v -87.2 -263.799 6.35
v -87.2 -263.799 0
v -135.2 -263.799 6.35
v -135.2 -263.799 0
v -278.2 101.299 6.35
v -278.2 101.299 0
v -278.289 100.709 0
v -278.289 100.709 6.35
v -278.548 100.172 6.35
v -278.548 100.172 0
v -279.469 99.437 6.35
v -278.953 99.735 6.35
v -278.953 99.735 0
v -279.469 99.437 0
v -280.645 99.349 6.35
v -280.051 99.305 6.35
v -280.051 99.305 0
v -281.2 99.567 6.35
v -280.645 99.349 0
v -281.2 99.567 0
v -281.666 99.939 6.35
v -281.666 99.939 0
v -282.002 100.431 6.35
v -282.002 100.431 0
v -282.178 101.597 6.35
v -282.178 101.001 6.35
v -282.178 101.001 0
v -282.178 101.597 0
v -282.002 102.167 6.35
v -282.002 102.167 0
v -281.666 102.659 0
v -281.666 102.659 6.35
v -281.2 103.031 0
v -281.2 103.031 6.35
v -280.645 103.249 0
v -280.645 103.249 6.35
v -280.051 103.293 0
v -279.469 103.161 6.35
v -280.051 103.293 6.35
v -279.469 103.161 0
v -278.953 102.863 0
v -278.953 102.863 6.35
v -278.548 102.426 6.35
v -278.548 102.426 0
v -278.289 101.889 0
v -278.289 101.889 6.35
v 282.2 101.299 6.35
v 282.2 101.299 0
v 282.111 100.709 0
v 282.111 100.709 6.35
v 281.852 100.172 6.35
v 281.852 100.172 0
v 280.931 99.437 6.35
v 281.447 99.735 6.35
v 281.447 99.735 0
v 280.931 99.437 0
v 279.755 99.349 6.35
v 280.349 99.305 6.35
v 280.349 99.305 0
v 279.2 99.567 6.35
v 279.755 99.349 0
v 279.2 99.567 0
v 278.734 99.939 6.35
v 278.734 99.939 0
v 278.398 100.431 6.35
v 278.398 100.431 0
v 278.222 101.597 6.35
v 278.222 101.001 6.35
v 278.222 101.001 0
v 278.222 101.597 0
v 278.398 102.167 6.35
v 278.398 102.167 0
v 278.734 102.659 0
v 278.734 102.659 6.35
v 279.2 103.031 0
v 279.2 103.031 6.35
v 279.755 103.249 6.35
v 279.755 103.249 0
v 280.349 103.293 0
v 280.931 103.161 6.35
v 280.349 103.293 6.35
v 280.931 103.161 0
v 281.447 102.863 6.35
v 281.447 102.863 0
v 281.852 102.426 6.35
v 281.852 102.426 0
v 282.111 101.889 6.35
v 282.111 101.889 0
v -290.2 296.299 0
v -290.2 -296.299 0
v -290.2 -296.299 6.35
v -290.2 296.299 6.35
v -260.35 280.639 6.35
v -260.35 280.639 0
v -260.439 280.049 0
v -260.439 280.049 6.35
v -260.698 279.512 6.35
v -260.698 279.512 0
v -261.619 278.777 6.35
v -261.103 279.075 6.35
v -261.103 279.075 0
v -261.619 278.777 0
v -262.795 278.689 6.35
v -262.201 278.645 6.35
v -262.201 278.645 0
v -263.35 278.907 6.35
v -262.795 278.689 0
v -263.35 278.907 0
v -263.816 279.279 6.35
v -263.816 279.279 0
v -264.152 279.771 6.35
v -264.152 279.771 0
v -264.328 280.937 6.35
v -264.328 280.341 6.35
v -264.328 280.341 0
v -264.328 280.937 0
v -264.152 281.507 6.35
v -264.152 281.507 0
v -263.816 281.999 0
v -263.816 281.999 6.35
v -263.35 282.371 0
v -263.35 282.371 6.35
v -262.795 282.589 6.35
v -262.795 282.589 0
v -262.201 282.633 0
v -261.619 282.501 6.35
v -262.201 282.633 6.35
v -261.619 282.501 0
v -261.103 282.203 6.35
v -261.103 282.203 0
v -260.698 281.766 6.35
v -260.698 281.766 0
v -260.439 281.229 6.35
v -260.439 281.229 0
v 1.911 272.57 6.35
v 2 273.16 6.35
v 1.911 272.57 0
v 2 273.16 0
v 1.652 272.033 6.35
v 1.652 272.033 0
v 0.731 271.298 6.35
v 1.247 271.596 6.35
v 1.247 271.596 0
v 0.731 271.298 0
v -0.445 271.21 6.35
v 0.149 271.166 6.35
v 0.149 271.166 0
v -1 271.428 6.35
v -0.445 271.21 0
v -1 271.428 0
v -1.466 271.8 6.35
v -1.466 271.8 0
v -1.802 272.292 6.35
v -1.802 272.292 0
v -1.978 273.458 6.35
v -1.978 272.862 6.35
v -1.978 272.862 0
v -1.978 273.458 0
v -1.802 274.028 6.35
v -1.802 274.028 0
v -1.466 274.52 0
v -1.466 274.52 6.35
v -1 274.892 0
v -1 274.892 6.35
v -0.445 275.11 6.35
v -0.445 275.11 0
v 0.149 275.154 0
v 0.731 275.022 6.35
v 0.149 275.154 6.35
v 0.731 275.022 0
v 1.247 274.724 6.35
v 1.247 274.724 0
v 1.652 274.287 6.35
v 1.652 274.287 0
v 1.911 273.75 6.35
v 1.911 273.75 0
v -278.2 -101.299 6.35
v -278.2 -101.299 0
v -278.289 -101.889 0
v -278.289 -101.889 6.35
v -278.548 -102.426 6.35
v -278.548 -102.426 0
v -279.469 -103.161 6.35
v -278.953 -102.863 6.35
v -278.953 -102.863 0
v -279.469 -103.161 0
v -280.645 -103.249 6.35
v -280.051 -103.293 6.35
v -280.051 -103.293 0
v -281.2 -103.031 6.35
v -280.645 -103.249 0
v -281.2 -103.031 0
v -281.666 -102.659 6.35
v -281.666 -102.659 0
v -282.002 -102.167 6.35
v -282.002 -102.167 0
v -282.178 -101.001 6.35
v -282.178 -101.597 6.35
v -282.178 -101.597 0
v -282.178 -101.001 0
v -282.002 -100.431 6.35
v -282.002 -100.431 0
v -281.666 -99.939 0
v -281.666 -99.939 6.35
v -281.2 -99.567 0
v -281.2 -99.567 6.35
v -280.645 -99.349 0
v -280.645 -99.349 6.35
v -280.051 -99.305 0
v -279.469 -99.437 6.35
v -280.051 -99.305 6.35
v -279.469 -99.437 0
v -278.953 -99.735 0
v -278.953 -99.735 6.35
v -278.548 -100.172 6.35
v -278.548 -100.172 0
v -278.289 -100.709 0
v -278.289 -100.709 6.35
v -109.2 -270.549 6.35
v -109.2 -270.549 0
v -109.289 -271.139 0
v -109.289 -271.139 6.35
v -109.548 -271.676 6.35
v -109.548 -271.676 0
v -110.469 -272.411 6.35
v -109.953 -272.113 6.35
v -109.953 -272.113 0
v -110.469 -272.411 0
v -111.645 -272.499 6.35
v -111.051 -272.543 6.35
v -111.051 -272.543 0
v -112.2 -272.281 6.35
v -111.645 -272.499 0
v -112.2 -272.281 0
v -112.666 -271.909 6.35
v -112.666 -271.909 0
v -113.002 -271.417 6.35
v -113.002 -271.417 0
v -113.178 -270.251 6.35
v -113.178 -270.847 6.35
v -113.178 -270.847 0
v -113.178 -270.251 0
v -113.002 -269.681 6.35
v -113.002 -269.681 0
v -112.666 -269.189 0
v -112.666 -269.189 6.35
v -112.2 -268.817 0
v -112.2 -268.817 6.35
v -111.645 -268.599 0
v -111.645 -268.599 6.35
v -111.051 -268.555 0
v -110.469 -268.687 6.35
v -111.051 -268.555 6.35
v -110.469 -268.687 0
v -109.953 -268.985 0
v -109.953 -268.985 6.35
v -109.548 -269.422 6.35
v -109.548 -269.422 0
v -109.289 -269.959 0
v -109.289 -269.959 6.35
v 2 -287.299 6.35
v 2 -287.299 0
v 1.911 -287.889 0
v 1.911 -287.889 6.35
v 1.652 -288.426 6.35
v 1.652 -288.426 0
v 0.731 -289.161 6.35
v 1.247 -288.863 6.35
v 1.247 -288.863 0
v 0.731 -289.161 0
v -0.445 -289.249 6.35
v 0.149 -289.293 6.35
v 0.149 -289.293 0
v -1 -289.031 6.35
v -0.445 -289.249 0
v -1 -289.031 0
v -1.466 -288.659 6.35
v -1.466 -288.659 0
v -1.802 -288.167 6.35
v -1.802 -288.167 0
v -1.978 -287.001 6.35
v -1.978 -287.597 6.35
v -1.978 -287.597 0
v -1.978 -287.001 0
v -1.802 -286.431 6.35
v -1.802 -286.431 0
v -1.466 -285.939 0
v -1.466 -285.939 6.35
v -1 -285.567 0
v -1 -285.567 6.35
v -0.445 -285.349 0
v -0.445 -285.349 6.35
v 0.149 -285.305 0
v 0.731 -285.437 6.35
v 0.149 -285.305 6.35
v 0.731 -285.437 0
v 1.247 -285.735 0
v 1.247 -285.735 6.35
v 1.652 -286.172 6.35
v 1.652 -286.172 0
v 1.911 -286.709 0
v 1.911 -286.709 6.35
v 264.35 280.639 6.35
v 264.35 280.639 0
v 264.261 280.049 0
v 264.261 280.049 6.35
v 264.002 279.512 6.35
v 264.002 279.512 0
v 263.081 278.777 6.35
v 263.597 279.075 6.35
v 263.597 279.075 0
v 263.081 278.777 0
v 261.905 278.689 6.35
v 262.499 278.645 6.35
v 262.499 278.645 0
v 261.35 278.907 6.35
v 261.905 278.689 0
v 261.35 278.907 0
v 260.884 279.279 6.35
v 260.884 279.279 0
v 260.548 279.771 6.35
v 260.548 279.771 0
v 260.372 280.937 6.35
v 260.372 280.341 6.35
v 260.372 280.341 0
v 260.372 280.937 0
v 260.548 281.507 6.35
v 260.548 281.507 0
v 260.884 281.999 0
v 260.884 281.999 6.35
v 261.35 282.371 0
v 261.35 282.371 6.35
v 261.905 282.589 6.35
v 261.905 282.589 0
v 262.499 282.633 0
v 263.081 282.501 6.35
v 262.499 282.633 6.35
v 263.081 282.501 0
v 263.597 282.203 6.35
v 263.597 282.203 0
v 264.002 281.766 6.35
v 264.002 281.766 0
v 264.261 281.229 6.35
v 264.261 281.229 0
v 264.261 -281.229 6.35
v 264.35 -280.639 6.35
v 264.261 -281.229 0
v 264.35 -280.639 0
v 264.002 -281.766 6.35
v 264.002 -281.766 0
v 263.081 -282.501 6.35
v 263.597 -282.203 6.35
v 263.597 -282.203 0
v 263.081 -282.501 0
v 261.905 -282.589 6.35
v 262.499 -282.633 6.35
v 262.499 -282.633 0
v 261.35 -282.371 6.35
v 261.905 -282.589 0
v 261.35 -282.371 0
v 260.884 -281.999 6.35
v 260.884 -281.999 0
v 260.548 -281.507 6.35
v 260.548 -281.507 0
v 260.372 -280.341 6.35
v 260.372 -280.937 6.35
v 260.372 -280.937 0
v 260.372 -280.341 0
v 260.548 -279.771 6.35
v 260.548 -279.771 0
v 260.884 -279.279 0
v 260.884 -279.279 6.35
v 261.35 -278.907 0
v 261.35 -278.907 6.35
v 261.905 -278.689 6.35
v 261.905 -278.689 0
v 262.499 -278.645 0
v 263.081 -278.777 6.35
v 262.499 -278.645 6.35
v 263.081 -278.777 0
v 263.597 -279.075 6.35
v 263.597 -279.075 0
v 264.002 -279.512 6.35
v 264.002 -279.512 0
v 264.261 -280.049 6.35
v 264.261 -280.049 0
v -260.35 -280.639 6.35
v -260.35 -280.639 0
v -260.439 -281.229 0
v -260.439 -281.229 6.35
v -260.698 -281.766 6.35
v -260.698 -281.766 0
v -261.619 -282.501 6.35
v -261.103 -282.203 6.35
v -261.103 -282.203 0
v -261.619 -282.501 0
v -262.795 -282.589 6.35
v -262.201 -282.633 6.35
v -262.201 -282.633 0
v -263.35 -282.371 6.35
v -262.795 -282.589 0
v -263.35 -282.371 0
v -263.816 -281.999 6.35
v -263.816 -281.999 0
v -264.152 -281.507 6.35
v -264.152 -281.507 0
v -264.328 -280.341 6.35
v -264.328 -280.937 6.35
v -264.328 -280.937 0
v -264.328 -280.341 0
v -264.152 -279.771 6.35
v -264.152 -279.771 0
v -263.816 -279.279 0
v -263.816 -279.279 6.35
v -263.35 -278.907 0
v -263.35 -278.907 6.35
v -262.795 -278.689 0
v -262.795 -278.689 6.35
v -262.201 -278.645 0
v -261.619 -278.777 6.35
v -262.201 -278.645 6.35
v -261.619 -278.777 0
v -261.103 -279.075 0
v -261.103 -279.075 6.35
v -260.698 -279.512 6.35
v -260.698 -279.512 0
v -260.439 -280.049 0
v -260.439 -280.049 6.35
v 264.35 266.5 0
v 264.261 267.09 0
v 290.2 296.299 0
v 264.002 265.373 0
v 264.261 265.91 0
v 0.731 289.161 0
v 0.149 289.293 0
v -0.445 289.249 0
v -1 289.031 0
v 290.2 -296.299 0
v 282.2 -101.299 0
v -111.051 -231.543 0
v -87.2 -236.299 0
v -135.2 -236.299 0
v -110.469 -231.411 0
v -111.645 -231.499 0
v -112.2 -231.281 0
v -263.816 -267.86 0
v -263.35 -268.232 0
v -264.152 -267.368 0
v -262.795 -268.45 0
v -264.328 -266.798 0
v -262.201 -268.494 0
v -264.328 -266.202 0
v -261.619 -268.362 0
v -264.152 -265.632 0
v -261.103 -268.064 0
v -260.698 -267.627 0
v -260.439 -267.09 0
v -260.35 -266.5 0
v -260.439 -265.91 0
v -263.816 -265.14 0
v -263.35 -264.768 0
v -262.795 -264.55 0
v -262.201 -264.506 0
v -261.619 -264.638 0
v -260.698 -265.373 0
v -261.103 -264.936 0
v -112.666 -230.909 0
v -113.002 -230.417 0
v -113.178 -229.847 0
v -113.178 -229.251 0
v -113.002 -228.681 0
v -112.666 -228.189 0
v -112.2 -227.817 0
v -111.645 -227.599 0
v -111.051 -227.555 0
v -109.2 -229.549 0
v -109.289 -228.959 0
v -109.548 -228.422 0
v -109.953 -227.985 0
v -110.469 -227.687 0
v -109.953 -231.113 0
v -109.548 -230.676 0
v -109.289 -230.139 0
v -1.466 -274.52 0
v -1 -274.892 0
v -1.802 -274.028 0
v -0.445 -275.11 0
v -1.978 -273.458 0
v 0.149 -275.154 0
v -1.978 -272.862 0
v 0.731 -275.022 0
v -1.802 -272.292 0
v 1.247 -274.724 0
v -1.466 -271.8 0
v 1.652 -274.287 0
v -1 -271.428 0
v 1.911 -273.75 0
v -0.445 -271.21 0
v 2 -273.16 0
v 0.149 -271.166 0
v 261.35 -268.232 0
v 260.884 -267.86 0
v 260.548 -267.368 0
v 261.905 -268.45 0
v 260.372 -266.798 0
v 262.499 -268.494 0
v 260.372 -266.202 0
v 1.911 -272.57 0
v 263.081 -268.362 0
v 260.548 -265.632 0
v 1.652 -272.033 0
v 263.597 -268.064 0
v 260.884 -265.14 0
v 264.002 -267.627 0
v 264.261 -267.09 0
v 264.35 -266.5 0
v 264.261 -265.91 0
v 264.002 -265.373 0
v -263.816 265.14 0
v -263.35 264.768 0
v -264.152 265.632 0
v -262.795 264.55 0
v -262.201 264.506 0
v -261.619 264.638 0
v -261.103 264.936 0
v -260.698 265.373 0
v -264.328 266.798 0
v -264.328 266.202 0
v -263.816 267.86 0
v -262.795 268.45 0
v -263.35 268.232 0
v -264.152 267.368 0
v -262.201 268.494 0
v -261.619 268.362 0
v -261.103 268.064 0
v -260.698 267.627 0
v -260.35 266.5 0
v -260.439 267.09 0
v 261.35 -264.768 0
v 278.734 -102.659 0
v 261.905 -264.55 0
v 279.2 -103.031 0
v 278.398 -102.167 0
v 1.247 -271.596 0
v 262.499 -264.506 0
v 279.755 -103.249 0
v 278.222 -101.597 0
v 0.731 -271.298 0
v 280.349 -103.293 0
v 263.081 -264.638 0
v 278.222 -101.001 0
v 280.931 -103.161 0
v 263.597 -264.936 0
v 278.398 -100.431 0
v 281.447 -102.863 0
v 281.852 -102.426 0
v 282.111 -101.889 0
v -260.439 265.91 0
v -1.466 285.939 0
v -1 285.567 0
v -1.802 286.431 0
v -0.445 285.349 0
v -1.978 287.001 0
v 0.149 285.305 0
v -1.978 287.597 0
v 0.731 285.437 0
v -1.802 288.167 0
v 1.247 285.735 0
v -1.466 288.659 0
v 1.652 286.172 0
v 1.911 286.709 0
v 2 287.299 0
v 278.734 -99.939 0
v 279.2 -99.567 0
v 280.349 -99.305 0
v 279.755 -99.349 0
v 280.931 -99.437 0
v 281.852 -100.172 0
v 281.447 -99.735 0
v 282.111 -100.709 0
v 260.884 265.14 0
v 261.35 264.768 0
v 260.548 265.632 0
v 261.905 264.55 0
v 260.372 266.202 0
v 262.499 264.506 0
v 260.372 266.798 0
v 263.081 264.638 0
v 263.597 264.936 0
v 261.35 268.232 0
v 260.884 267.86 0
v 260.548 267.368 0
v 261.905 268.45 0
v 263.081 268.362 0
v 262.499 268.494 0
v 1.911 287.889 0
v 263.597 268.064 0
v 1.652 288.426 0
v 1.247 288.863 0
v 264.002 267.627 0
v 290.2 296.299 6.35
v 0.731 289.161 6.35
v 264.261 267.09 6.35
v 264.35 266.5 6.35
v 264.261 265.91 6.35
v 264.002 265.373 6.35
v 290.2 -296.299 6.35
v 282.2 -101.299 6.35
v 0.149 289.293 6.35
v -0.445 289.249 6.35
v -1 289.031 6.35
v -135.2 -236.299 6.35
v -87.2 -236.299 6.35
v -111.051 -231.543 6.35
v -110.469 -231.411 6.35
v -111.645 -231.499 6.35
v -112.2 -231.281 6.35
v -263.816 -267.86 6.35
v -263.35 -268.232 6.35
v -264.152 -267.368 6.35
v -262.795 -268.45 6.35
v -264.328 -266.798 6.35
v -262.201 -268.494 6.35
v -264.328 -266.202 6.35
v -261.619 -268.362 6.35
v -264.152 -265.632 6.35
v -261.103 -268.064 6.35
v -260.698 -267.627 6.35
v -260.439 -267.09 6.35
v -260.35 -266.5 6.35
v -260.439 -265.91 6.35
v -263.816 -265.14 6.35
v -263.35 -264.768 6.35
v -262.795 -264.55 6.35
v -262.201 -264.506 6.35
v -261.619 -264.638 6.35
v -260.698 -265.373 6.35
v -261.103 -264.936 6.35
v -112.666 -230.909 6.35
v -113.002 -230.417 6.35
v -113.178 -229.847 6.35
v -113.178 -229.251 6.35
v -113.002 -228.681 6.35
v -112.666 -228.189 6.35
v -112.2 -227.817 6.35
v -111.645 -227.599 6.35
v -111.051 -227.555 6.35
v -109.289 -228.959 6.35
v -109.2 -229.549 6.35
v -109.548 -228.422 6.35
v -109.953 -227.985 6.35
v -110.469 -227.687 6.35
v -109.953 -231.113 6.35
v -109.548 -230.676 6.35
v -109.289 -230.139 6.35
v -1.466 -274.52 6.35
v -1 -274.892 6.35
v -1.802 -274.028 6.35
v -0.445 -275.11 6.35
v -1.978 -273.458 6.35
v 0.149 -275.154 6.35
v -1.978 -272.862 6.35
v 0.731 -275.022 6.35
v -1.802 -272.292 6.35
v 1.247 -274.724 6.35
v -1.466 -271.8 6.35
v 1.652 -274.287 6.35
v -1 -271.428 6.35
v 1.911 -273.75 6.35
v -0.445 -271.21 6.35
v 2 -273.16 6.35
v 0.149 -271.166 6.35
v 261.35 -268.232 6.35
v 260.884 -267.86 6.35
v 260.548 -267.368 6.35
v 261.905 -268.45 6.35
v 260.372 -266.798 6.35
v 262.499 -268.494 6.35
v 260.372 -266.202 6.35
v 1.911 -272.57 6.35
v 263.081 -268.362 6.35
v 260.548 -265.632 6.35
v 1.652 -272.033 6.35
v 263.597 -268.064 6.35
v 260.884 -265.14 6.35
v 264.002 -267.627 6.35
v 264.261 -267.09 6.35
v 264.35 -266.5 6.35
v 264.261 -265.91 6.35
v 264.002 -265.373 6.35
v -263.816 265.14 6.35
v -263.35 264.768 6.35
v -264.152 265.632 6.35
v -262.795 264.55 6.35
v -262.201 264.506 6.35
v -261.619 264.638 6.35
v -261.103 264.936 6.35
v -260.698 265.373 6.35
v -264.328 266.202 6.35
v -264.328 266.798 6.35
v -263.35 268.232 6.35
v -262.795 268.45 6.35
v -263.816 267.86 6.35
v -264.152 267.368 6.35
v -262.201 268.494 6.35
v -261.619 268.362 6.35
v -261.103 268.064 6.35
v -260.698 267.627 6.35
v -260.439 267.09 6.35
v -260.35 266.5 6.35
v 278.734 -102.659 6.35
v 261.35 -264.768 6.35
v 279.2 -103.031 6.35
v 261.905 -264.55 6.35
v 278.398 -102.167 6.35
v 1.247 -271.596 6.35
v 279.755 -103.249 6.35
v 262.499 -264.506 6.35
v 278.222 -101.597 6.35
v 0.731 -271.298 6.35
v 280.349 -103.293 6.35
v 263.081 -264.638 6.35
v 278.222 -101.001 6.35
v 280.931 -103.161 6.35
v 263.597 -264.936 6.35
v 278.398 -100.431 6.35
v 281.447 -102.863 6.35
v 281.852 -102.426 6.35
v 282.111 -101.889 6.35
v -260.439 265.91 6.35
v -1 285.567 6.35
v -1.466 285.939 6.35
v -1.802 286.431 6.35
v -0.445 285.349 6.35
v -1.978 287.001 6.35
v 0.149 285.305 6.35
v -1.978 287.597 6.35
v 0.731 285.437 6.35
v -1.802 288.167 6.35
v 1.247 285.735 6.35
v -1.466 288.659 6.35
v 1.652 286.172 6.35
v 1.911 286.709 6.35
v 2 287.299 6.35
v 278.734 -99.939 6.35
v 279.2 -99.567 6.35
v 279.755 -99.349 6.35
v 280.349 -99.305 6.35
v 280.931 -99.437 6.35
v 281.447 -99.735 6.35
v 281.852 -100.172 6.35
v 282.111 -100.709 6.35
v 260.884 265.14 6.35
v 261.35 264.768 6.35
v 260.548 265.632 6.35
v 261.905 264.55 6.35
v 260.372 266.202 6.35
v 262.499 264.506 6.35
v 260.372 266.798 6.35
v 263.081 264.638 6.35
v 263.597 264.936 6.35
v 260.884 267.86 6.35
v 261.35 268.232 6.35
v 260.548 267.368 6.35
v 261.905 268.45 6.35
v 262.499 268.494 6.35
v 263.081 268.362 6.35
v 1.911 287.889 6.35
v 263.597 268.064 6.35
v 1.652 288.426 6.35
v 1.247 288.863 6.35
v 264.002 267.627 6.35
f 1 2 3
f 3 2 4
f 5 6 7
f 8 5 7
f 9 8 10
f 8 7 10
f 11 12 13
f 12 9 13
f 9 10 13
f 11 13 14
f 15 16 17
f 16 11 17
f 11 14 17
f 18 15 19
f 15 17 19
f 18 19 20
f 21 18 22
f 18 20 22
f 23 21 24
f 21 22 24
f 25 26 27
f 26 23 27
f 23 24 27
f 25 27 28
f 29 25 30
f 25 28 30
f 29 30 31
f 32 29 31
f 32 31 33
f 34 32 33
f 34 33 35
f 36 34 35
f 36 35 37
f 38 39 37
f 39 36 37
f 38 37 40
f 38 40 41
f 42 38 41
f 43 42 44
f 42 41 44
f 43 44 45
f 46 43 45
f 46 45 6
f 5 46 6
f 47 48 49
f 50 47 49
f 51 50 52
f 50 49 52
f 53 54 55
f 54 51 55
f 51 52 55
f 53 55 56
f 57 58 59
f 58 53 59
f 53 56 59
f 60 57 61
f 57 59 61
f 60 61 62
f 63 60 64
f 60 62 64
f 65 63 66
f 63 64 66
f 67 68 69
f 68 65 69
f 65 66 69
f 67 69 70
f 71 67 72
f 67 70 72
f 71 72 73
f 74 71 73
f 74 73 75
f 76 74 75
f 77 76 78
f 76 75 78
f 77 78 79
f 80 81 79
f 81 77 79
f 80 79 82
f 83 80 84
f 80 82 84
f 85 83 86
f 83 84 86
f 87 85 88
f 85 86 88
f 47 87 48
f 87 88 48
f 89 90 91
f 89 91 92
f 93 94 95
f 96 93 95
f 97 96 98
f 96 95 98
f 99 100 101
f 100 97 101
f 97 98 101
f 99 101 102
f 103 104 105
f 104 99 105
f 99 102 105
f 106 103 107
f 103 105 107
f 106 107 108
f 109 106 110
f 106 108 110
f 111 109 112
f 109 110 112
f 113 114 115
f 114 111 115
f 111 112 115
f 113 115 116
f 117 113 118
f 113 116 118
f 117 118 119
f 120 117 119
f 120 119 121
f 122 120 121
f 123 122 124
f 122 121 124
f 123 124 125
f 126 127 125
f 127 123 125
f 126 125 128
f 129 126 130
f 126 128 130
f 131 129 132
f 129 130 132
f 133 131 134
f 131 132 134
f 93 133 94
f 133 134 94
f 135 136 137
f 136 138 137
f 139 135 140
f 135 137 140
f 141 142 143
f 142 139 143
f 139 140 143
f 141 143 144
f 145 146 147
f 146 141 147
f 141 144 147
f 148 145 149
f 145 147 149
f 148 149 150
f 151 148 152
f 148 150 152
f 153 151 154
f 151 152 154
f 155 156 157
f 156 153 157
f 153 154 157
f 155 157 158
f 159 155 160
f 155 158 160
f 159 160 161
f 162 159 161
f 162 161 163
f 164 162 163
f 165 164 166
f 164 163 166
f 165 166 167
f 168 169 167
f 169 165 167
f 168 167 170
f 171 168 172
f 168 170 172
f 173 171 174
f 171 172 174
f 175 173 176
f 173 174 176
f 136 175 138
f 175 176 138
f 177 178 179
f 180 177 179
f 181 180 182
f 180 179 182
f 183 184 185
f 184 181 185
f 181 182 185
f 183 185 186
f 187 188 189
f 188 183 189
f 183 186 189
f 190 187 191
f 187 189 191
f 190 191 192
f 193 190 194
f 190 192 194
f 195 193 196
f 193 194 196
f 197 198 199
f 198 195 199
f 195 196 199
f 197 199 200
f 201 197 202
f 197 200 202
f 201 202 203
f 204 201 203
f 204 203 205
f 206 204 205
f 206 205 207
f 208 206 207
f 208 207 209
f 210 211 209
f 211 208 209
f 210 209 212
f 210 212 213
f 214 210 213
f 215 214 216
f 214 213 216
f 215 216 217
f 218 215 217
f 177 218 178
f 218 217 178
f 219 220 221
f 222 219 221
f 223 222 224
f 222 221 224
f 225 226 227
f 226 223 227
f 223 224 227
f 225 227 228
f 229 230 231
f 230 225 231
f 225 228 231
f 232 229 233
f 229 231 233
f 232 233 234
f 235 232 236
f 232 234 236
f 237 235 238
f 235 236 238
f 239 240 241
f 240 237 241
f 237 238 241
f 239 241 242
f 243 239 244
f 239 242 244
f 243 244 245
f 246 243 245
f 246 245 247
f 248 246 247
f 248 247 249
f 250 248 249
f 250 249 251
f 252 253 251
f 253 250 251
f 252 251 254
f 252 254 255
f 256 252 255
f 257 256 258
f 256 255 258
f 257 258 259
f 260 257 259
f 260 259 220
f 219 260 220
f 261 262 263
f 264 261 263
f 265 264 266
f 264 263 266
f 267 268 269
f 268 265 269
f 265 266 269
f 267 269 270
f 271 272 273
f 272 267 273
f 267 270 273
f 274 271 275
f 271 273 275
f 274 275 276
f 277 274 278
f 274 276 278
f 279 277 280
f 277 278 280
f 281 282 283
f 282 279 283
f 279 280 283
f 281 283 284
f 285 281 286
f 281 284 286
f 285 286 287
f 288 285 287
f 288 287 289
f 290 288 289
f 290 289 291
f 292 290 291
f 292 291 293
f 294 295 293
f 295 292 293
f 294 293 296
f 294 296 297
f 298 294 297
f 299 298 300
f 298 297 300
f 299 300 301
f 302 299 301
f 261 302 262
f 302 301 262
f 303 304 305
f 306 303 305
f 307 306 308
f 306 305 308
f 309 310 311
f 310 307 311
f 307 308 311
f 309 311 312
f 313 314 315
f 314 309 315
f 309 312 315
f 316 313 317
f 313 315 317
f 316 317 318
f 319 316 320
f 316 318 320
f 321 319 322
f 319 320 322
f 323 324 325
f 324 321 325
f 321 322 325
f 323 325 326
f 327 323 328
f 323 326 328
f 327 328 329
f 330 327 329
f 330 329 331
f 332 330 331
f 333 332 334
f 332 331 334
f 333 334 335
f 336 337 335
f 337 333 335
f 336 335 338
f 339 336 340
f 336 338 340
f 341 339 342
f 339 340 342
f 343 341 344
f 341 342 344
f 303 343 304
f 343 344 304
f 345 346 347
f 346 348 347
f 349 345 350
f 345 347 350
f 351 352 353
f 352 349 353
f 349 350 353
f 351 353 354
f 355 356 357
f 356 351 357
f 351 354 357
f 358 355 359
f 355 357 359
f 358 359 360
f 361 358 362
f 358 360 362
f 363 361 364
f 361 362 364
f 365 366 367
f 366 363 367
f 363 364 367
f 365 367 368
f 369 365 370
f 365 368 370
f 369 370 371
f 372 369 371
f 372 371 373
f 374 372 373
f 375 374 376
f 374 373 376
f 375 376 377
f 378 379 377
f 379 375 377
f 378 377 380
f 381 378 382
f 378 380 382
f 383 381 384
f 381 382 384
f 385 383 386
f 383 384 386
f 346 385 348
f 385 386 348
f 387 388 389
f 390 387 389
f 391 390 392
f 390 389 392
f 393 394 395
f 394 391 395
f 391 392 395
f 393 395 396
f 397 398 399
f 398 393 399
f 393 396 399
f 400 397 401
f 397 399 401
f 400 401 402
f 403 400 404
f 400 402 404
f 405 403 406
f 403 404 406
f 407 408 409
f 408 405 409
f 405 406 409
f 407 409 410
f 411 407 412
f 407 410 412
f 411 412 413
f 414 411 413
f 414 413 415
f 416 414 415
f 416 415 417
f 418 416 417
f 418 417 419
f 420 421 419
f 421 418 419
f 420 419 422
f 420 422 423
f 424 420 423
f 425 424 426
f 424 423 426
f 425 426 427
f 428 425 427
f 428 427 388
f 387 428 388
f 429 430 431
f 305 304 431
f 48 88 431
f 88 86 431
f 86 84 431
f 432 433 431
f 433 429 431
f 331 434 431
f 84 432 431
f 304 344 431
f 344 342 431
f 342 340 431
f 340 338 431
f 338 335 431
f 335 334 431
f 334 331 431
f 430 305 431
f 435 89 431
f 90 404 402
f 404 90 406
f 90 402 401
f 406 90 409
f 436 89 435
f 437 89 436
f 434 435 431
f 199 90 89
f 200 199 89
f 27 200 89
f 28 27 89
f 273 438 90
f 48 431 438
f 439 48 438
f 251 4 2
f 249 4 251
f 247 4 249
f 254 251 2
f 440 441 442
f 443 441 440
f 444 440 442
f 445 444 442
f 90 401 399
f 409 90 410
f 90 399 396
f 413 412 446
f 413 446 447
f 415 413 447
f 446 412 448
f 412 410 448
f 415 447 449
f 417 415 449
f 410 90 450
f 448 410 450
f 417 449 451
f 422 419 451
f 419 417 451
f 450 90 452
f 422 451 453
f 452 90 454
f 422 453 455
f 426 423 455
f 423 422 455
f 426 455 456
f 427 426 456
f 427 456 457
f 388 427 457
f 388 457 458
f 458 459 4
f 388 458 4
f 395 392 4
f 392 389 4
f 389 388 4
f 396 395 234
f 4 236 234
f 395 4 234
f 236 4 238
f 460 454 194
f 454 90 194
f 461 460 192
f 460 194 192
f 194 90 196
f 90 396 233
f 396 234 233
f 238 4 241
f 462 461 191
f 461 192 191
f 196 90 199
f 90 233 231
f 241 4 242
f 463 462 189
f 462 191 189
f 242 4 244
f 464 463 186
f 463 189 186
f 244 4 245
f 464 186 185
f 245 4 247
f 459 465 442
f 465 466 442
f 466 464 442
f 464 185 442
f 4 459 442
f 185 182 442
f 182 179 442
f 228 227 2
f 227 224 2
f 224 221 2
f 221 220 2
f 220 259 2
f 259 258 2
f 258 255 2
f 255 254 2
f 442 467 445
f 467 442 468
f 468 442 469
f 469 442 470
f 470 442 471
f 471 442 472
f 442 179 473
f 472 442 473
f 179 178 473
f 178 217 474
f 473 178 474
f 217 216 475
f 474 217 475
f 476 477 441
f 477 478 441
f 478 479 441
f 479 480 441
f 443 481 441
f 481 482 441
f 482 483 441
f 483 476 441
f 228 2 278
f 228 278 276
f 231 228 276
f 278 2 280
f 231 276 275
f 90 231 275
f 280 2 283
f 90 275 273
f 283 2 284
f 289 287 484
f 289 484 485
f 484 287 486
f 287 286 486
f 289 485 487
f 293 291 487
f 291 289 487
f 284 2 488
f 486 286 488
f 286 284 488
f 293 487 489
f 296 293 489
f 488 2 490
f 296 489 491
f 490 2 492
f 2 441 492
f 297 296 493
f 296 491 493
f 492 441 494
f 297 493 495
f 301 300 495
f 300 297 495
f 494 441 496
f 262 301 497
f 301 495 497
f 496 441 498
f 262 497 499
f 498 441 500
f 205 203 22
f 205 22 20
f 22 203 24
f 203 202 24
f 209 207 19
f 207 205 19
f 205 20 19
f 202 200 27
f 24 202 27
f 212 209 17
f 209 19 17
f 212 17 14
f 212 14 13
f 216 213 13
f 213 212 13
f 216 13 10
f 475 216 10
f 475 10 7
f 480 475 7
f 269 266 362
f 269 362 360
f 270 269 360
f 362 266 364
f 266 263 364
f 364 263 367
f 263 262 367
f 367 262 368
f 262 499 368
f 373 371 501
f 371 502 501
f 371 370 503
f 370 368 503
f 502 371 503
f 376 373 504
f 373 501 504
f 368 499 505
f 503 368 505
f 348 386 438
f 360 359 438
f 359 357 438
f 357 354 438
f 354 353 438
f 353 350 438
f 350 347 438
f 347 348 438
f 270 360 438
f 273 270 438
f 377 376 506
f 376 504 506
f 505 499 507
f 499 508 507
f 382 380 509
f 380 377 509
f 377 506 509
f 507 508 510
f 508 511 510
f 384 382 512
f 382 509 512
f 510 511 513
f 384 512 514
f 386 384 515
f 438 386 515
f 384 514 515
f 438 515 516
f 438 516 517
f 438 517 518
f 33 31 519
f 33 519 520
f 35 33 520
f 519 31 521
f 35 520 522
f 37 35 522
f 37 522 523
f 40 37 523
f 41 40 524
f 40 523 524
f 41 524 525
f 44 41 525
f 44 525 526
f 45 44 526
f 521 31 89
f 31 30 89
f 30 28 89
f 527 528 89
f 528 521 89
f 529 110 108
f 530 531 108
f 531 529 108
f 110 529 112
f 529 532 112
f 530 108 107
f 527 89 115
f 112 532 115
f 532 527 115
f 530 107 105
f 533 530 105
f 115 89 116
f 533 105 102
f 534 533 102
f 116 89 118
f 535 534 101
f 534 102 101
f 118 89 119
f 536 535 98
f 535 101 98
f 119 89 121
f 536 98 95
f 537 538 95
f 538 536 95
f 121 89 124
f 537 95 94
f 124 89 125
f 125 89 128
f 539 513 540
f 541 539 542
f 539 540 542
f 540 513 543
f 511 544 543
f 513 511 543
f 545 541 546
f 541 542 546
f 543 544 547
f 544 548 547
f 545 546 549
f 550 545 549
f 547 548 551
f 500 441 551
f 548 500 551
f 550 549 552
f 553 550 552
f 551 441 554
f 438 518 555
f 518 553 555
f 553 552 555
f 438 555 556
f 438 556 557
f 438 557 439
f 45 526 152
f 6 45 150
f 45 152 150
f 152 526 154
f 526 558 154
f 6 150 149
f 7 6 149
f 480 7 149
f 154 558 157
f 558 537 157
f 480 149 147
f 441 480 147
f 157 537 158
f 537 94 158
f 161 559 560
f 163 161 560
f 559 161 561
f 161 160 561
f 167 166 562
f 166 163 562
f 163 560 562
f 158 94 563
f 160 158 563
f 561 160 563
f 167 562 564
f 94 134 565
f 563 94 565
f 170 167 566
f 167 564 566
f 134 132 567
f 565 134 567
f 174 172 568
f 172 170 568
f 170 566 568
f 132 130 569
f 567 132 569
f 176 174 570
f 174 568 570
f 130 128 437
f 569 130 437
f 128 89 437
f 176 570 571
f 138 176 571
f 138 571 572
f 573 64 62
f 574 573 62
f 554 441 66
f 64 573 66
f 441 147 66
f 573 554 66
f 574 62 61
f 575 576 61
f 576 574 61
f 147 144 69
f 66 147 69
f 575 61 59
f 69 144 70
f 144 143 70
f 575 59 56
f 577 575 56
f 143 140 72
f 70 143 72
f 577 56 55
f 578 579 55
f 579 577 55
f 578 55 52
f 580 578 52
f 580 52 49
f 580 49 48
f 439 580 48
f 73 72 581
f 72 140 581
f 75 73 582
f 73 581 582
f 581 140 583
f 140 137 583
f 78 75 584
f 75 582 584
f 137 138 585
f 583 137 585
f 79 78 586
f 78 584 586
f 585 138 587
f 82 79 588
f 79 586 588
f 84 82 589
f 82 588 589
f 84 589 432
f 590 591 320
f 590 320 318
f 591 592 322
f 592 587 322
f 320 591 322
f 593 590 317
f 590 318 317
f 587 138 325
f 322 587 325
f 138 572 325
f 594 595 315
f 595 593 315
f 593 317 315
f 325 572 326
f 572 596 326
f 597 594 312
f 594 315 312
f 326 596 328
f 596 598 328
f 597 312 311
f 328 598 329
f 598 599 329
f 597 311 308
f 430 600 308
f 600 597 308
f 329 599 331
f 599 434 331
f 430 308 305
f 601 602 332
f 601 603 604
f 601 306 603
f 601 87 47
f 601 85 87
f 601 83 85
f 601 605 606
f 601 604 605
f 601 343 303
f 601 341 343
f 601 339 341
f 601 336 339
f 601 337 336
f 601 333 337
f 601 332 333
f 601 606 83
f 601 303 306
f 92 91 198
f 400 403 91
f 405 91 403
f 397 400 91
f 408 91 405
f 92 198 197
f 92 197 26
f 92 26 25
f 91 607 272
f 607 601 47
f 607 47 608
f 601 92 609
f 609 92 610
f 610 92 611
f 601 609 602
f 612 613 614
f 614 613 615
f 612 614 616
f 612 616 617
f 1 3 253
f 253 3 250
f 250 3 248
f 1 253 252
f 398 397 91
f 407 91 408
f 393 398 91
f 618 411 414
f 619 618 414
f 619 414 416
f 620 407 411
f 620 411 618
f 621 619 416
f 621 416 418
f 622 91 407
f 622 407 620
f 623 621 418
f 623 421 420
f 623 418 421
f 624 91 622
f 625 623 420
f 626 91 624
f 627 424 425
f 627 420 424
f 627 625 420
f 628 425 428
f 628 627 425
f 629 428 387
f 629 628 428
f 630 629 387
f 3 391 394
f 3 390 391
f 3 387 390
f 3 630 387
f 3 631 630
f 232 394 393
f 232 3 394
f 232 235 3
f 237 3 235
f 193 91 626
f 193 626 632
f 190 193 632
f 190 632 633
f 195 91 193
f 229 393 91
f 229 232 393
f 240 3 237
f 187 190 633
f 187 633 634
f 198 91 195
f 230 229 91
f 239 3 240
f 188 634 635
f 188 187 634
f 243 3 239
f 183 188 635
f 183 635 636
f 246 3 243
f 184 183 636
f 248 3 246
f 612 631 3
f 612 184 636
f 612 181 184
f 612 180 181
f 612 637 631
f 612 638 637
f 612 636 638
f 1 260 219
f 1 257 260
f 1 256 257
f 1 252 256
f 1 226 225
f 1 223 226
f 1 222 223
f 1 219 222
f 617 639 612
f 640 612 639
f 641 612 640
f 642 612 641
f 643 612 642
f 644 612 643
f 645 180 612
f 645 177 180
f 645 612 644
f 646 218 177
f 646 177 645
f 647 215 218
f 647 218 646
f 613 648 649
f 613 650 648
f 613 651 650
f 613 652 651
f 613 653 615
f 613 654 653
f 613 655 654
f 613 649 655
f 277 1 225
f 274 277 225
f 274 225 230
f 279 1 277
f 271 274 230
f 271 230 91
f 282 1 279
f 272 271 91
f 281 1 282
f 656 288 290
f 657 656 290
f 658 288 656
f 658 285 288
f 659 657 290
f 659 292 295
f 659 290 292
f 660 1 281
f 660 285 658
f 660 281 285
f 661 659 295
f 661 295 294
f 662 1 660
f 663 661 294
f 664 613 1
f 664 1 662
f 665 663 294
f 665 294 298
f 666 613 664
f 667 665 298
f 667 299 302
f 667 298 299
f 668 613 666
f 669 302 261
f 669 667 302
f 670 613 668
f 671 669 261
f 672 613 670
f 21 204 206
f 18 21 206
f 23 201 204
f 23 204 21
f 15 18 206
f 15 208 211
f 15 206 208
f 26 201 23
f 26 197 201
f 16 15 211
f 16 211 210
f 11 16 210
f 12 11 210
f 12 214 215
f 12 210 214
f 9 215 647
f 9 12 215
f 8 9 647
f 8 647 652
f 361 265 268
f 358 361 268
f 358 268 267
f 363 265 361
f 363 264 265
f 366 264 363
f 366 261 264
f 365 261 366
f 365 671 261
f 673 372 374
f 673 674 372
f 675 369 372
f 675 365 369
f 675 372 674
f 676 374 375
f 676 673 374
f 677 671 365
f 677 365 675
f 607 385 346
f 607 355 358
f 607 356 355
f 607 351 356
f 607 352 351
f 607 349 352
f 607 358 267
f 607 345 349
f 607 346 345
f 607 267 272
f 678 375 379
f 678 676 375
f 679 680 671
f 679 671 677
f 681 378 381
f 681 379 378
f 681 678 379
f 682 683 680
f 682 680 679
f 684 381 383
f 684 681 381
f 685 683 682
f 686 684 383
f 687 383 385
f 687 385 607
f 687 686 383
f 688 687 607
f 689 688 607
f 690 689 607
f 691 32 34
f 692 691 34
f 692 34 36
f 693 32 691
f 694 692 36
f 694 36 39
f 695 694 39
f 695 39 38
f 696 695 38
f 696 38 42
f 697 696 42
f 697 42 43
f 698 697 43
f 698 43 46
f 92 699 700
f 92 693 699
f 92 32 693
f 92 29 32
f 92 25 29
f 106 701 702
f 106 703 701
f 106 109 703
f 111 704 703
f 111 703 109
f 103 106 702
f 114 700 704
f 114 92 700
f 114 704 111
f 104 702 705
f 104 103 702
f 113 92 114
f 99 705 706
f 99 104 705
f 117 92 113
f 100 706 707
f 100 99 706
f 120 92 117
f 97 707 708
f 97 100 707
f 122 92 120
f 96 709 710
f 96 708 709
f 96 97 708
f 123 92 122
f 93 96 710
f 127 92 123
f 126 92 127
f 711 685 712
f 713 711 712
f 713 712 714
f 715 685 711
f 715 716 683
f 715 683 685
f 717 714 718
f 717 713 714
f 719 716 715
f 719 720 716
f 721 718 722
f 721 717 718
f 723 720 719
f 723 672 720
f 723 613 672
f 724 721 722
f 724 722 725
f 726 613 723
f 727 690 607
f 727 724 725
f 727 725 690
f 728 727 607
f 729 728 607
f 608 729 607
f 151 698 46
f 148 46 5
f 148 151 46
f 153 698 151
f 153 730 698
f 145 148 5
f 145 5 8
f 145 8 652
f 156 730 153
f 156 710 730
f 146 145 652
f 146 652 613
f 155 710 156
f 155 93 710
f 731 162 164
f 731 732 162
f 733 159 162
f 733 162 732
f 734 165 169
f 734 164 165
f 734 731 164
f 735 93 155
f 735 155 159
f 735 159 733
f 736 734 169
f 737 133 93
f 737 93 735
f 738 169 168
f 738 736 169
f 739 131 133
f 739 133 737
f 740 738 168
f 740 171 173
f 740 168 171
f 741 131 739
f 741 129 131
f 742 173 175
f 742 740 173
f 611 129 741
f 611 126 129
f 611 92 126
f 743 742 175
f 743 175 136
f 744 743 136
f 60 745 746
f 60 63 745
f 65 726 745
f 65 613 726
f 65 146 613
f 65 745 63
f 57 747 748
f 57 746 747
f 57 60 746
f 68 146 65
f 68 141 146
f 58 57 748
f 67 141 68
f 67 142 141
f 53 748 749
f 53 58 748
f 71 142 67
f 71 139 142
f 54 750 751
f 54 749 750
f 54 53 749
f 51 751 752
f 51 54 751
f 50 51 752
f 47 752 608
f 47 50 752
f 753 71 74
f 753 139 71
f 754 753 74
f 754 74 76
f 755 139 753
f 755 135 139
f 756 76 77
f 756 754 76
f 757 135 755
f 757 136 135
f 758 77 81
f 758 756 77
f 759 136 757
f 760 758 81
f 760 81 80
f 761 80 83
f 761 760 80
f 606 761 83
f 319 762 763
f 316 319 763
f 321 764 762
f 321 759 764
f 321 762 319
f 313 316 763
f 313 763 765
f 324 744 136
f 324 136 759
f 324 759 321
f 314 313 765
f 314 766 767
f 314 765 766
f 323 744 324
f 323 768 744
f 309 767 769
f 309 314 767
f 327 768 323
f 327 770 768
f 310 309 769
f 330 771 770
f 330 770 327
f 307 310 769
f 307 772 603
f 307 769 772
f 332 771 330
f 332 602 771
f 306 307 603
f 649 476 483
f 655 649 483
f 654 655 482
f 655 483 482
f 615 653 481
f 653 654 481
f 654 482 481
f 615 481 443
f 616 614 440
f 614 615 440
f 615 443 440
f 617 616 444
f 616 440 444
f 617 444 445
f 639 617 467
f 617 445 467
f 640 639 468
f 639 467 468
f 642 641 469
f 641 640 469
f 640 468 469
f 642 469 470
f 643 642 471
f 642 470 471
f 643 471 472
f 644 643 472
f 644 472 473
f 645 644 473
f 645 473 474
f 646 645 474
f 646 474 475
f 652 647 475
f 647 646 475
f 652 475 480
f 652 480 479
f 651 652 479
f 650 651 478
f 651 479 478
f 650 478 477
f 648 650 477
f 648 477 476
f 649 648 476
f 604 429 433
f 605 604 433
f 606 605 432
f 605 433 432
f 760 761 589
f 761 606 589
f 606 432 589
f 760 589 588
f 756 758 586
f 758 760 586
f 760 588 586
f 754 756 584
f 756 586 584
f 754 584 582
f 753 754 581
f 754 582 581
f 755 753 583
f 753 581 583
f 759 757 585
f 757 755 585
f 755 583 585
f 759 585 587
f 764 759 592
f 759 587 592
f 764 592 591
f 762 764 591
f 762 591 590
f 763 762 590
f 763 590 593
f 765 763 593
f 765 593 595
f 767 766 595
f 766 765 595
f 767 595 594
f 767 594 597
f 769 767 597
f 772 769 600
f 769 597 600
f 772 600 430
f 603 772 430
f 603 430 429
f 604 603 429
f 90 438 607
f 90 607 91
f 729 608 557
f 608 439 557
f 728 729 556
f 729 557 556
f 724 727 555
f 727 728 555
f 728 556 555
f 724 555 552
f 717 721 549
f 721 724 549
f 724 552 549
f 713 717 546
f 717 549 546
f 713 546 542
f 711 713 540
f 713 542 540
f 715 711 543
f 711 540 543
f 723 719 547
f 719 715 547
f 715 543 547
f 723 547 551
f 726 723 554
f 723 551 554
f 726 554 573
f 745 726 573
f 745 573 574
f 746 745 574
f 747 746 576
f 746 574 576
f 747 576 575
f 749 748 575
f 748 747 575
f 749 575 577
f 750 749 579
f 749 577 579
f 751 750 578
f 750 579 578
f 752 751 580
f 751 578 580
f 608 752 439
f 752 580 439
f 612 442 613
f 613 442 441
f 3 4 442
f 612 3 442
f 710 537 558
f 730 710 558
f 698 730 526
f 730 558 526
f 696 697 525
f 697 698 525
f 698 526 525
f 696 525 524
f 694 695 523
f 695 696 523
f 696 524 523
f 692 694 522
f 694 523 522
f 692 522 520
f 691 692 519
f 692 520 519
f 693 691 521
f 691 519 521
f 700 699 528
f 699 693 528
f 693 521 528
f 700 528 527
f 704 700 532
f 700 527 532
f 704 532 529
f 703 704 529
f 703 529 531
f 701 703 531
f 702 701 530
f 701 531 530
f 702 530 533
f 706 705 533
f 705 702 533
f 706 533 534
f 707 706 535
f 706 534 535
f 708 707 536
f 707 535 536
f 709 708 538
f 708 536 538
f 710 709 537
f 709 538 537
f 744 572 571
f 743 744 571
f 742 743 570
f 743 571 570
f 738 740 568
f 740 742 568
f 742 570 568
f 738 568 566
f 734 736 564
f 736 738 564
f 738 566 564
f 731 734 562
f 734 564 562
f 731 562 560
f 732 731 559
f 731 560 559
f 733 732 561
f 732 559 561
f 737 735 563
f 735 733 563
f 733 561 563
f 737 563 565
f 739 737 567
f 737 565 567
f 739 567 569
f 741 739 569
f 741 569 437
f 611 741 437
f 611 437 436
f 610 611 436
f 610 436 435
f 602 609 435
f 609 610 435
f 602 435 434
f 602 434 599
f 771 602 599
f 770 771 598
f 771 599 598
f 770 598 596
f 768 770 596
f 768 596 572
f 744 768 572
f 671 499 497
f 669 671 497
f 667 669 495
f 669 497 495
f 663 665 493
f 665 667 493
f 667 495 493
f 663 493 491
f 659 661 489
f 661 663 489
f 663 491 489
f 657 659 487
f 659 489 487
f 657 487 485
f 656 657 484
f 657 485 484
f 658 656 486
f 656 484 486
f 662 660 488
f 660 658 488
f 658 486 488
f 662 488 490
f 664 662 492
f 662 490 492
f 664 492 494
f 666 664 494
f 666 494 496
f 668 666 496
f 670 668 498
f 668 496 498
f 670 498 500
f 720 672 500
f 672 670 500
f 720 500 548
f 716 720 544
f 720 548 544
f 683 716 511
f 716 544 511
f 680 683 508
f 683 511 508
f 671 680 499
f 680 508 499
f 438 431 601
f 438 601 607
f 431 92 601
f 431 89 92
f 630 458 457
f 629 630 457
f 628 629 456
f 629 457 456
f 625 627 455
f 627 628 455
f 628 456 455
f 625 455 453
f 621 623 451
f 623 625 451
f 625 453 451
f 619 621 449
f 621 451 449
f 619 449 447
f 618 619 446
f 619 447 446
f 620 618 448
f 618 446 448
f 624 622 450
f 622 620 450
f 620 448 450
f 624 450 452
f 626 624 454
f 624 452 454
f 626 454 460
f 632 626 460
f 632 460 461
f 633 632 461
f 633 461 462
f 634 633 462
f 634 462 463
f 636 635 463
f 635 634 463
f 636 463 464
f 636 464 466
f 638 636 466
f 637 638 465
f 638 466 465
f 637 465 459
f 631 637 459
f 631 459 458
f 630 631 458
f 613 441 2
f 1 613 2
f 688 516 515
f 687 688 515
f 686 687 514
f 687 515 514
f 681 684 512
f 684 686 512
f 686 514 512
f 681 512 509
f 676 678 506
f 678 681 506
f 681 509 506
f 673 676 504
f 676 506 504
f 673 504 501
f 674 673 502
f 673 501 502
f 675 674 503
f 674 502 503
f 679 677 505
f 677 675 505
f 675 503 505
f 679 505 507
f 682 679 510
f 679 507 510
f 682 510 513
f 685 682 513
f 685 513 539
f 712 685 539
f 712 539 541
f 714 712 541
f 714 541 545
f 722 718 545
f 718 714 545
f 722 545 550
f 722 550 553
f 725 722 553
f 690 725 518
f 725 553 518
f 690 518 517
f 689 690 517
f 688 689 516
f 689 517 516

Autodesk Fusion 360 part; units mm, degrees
sketch "Sketch1" plane through (0, 0, 0) normal (0, 0, 1) x (1, 0, 0)
  line L0 (285.2, -291.299) -> (-285.2, -291.299)
  line L1 (-285.2, -291.299) -> (-285.2, 291.299)
  line L2 (-285.2, 291.299) -> (285.2, 291.299)
  line L3 (285.2, 291.299) -> (285.2, -291.299)
  line L4 (285.2, -291.299) -> (-285.2, 291.299) construction
  line L5 (-285.2, -291.299) -> (285.2, 291.299) construction
  line L6 (-262.35, 291.299) -> (-262.35, -291.299) construction
  circle A0 centre (-262.35, 280.639) radius 2
  circle A1 centre (-262.35, 266.5) radius 2
  circle A2 centre (-262.35, -280.639) radius 2
  circle A3 centre (-262.35, -266.5) radius 2
  line L7 (262.35, 291.299) -> (262.35, -291.299) construction
  circle A4 centre (262.35, 280.639) radius 2
  circle A5 centre (262.35, 266.5) radius 2
  circle A6 centre (262.35, -280.639) radius 2
  circle A7 centre (262.35, -266.5) radius 2
  line L8 (-262.35, -266.5) -> (262.35, -266.5) construction
  circle A8 centre (0, -273.16) radius 2
  line L9 (0, -291.299) -> (0, 291.299) construction
  circle A9 centre (0, 273.16) radius 2
  circle A10 centre (0, 287.299) radius 2
  circle A11 centre (0, -287.299) radius 2
  line L10 (-290.2, 296.299) -> (290.2, 296.299)
  line L11 (290.2, 296.299) -> (290.2, -296.299)
  line L12 (290.2, -296.299) -> (-290.2, -296.299)
  line L13 (-290.2, -296.299) -> (-290.2, 296.299)
  line L14 (-290.2, -101.299) -> (290.2, -101.299) construction
  line L15 (-290.2, 101.299) -> (290.2, 101.299) construction
  circle A12 centre (-280.2, 101.299) radius 2
  circle A13 centre (-280.2, -101.299) radius 2
  circle A14 centre (280.2, -101.299) radius 2
  circle A15 centre (280.2, 101.299) radius 2
  line L16 (-135.2, -236.299) -> (-87.2, -236.299)
  line L17 (-87.2, -236.299) -> (-87.2, -263.799)
  line L18 (-87.2, -263.799) -> (-135.2, -263.799)
  line L19 (-135.2, -263.799) -> (-135.2, -236.299)
  line L20 (-111.2, -221.3553) -> (-111.2, -265.3735) construction
  circle A16 centre (-111.2, -270.549) radius 2
  circle A17 centre (-111.2, -229.549) radius 2
  line L21 (-262.35, 266.5) -> (262.35, 266.5) construction
  line L22 (-262.35, -280.639) -> (262.35, -280.639) construction
  line L23 (262.35, 280.639) -> (-262.35, 280.639) construction
  dimension "d1" = 570.4
  dimension "d2" = 582.598
  dimension "d3" = 22.85
  dimension "d4" = 4
  dimension "d6" = 4
  dimension "d8" = 4
  dimension "d9" = 4
  dimension "d12" = 22.85
  dimension "d13" = 4
  dimension "d14" = 4
  dimension "d17" = 4
  dimension "d18" = 4
  dimension "d21" = 4
  dimension "d22" = 4
  dimension "d23" = 4
  dimension "d24" = 4
  dimension "d30" = 5
  dimension "d31" = 5
  dimension "d32" = 5
  dimension "d33" = 5
  dimension "d34" = 190
  dimension "d35" = 190
  dimension "d36" = 4
  dimension "d37" = 5
  dimension "d38" = 4
  dimension "d39" = 5
  dimension "d40" = 4
  dimension "d41" = 5
  dimension "d42" = 4
  dimension "d43" = 5
  dimension "d44" = 48
  dimension "d45" = 27.5
  dimension "d46" = 55
  dimension "d47" = 150
  dimension "d48" = 24
  dimension "d49" = 4
  dimension "d50" = 4
  dimension "d51" = 41
  dimension "d52" = 20.5
  dimension "d53" = 24.799
  dimension "d54" = 24.799
  dimension "d55" = 10.66
  dimension "d56" = 10.66
  dimension "d60" = 14.139
  dimension "d61" = 4
  dimension "d62" = 14.139
  dimension "d63" = 4
extrude "Extrude1" add sketch "Sketch1" along normal blind 6.35 contours L0 L1 L2 L3 | L10 L11 L12 L13 makes body 1
copy_body "Body->Comp1" bodies 1 removing the originals makes body 2 in component "back"
component "back" placed x (1, 0, 0) y (0, 1, 0) z (0, 0, 1) at (0, 0, 0)
equation "d1 = XRailLength + 220.4 mm"
equation "d2 = PrintHeight + 282.598 mm"
equation "d28 = ( 25.4 / 4 ) * 1 mm"
equation "d30 = WallThickness"
equation "d31 = WallThickness"
equation "d32 = WallThickness"
equation "d33 = WallThickness"
equation "WallThickness = 5 mm"
equation "XRailLength = 350 mm"
equation "PrintHeight = 300 mm"
